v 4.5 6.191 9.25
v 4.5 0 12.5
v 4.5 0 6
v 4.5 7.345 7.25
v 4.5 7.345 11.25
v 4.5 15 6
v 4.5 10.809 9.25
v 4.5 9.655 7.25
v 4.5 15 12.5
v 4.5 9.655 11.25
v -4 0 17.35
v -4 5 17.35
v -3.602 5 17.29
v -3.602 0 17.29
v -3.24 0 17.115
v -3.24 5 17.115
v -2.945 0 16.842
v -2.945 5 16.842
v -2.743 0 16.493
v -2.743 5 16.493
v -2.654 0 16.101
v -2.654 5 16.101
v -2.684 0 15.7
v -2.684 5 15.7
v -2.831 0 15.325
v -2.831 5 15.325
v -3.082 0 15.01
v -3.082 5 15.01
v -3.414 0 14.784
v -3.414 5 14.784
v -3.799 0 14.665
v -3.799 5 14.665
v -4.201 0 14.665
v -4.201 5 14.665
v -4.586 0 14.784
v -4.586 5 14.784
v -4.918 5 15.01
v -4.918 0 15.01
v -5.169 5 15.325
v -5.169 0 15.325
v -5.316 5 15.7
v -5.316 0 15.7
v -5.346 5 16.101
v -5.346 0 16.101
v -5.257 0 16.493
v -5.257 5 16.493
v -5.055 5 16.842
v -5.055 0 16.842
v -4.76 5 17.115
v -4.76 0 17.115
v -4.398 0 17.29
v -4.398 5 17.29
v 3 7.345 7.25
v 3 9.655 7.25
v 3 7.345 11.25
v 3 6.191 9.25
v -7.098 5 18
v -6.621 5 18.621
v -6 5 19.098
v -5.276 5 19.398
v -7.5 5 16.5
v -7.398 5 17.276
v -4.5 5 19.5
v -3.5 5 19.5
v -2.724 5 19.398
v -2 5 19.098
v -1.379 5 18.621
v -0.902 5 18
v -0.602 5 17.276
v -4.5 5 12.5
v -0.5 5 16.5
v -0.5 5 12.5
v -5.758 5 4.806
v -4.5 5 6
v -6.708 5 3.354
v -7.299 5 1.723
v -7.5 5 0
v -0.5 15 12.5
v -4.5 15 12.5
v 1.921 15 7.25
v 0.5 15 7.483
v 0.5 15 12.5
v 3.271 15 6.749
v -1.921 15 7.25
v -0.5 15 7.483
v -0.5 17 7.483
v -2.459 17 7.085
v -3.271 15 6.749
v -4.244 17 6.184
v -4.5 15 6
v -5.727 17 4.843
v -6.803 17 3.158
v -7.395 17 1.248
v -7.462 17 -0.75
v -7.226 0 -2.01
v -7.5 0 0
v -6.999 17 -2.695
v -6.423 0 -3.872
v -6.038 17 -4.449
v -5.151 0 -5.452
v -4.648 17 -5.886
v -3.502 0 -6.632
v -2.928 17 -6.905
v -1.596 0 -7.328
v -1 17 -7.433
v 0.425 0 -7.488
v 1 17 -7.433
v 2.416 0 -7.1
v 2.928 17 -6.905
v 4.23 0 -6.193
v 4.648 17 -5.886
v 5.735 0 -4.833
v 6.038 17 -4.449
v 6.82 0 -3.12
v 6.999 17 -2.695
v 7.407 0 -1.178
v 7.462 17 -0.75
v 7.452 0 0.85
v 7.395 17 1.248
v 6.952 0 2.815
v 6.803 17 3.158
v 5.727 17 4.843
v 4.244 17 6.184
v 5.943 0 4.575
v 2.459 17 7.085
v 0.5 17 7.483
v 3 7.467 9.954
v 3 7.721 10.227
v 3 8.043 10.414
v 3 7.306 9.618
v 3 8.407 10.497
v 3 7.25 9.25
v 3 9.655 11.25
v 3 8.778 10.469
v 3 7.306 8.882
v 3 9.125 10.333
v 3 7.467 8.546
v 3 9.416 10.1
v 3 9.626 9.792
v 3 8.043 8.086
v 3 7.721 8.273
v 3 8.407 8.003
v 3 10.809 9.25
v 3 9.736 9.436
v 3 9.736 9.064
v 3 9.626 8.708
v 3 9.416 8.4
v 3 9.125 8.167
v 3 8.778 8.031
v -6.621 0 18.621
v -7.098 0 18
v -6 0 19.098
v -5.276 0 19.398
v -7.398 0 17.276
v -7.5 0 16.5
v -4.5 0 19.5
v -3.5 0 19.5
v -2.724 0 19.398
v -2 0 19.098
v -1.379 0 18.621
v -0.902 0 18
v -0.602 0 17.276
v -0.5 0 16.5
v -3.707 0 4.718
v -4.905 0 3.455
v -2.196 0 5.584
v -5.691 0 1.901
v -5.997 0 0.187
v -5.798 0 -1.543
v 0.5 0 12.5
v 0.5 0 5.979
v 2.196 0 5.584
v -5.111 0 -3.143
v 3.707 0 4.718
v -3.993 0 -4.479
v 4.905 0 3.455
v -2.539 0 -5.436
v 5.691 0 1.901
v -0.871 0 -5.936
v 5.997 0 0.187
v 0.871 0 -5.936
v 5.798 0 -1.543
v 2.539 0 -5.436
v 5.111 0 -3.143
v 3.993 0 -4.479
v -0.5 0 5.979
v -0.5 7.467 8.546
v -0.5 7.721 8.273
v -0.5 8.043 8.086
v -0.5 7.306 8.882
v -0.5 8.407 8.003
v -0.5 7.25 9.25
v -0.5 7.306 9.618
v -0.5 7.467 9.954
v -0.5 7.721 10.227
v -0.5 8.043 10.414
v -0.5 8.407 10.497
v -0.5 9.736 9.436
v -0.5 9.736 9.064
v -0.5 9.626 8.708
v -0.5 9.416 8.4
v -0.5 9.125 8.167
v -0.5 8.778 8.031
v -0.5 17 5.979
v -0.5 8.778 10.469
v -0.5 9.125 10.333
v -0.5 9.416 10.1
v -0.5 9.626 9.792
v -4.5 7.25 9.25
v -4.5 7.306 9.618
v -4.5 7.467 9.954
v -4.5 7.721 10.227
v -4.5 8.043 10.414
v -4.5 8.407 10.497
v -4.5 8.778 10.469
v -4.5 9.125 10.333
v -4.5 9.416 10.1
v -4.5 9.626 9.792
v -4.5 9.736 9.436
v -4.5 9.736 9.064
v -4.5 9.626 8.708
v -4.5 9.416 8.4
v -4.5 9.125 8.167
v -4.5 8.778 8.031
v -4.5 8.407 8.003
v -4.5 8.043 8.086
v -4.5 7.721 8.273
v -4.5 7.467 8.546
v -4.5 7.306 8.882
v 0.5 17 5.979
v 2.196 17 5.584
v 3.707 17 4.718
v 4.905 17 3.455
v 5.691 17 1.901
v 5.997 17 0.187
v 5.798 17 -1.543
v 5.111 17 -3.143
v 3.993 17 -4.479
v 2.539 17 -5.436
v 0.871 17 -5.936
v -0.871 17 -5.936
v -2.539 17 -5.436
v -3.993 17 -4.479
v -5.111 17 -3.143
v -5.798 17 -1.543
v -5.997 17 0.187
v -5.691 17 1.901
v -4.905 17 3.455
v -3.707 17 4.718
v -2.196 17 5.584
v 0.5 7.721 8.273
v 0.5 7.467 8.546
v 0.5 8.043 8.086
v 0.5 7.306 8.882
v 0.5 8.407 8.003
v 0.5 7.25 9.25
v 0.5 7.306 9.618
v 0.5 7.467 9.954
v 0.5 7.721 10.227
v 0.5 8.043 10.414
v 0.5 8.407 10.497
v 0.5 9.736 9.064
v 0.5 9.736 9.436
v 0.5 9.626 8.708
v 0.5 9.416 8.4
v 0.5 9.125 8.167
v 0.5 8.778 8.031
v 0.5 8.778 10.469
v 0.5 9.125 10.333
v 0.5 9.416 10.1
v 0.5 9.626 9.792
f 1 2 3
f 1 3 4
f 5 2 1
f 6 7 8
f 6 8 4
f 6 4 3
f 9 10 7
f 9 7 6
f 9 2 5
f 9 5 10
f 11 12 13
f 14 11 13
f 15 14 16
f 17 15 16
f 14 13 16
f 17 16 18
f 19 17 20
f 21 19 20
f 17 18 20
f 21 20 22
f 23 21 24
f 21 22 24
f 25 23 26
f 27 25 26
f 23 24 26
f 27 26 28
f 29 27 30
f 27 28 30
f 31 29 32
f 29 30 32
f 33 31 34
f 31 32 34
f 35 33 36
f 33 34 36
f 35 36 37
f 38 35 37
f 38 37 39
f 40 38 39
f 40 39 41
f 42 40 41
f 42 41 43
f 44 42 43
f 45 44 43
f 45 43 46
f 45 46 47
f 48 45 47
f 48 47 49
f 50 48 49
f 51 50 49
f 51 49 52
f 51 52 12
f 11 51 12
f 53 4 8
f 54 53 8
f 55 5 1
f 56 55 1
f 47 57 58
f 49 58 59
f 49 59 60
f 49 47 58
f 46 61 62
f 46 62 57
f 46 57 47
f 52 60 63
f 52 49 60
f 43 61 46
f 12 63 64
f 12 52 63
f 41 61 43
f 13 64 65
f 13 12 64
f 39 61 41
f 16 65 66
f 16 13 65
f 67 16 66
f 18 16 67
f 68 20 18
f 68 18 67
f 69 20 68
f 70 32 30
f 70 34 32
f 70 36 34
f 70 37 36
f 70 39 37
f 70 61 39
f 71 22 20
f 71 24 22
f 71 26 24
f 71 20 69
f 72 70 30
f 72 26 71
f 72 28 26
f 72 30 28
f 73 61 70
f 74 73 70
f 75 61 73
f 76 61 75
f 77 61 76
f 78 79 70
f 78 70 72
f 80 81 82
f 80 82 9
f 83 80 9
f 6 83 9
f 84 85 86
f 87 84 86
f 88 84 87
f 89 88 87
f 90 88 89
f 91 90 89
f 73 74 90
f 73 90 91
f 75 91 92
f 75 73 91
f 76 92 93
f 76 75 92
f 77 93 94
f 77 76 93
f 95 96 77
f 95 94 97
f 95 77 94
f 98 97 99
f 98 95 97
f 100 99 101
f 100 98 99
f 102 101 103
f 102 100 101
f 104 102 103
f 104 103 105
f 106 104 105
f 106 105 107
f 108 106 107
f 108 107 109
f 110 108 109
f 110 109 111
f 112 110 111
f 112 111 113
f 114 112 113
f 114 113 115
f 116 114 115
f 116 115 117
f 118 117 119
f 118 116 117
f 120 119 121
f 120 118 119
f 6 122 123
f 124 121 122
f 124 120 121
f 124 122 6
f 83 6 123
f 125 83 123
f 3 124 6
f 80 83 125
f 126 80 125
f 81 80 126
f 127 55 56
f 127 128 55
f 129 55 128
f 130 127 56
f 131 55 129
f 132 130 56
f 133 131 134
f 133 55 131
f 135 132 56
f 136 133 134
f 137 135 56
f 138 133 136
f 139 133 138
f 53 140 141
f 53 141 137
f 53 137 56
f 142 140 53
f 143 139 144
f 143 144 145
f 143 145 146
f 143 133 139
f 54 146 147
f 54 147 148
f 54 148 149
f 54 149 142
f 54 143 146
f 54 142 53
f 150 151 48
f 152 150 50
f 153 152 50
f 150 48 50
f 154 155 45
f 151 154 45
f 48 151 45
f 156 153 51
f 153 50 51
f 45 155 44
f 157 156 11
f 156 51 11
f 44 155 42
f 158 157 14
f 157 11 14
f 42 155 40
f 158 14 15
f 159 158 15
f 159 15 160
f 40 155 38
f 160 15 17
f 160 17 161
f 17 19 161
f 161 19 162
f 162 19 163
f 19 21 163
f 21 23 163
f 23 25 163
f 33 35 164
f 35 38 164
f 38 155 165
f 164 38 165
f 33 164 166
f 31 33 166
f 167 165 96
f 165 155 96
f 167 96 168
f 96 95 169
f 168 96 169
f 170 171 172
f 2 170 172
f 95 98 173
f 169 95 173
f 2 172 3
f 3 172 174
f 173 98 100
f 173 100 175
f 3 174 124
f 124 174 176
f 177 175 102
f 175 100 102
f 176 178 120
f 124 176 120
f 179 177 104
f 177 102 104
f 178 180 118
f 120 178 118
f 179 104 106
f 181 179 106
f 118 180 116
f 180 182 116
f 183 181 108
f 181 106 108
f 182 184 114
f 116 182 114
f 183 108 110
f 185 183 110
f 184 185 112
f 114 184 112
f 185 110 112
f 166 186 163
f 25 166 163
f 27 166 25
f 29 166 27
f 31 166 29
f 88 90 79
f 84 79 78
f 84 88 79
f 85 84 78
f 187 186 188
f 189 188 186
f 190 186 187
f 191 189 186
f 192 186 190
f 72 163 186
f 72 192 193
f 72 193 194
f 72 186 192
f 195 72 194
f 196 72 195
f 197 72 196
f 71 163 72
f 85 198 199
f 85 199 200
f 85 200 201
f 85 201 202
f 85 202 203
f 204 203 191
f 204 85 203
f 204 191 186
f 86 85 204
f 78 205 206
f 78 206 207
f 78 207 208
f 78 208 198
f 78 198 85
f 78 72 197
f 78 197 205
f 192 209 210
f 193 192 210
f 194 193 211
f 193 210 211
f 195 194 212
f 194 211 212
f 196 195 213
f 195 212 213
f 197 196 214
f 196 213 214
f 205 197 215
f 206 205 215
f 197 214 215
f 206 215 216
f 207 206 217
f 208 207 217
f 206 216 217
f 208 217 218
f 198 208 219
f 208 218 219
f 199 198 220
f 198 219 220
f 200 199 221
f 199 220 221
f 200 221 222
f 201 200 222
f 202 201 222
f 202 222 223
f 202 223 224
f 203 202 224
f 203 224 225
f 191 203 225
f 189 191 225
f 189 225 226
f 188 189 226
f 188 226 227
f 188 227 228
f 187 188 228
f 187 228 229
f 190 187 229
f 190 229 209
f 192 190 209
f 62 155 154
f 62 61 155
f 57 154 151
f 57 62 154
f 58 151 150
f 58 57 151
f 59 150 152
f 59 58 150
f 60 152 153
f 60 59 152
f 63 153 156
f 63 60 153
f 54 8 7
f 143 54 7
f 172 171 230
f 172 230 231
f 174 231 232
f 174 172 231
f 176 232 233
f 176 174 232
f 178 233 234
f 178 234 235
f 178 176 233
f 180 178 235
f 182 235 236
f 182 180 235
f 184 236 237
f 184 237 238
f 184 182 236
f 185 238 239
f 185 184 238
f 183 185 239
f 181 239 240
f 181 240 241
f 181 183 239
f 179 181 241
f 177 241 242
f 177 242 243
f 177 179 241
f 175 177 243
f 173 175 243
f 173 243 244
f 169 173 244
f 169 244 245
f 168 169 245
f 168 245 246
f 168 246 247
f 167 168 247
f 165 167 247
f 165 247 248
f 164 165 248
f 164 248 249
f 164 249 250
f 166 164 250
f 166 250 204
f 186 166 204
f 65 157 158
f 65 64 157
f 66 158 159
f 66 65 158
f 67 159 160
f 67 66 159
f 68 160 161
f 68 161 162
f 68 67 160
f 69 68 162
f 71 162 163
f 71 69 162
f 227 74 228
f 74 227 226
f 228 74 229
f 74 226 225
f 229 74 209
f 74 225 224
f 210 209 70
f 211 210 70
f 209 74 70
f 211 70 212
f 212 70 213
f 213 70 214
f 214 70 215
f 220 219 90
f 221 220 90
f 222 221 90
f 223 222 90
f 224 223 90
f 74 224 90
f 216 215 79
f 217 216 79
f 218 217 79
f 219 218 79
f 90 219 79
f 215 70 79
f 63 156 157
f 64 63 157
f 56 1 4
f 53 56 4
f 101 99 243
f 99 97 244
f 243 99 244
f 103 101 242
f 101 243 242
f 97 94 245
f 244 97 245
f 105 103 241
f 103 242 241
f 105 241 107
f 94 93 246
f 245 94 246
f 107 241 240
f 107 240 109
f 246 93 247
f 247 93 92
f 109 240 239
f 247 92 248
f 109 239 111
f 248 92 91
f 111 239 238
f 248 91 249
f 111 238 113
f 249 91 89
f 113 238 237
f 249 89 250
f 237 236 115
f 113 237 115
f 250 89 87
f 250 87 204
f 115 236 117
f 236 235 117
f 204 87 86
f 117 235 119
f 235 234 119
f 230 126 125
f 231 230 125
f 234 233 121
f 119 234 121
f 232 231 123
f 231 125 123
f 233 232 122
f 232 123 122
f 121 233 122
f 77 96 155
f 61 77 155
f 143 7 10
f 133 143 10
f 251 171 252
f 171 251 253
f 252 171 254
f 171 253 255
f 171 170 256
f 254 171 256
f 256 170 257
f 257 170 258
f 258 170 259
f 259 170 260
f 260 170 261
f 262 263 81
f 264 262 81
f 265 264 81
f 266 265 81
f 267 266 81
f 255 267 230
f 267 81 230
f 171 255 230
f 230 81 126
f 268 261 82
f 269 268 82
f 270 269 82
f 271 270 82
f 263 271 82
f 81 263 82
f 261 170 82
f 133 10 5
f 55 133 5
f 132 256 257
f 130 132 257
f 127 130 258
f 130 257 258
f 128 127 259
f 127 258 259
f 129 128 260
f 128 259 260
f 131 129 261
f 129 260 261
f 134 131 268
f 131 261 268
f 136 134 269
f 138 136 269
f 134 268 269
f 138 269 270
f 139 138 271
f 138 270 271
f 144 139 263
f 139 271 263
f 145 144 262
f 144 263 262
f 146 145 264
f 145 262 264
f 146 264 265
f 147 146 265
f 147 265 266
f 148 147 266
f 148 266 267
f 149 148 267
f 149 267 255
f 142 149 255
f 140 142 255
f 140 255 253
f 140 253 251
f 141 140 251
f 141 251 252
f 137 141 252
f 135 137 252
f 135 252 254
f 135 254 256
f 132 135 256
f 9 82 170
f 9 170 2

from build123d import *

# Parameters (mm, degrees)
SKETCH_1_R                  = 7.5
SKETCH_1_R_2                = 6
EXTRUDE_1_DEPTH             = 17
CUT_EXTRUDE_1_REACH         = 25.88
CUT_EXTRUDE_1_END_RADIUS    = 6
SKETCH_2_W                  = 1
SKETCH_2_H                  = 17
SKETCH_3_W                  = 4
SKETCH_3_H                  = 17
EXTRUDE_2_DEPTH             = 5
EXTRUDE_2_DIRECTION_2_REACH = 25.88
CUT_EXTRUDE_START           = -2
CUT_EXTRUDE_4_DEPTH         = 2
CUT_EXTRUDE_2_REACH         = 26.274
SKETCH_4_R                  = 1.25
CUT_EXTRUDE_3_DEPTH         = 1.5
EXTRUDE_3_DEPTH             = 5
CUT_EXTRUDE_5_REACH         = 26.094
SKETCH_9_R                  = 1.35
FILLET_1_R                  = 3


with BuildPart() as part:
    # 草图1 → 凸台-拉伸1 (new body)
    with BuildSketch(Plane(origin=(0, 0, 0), x_dir=(1, 0, 0), z_dir=(0, 1, 0))):
        with Locations(Location((0, 0, 0), (0, 0, 270))):
            Circle(SKETCH_1_R)
        with Locations(Location((0, 0, 0), (0, 0, 270))):
            Circle(SKETCH_1_R_2, mode=Mode.SUBTRACT)
    extrude(amount=EXTRUDE_1_DEPTH)

    # 切除-拉伸1: up to this cylinder (the profile starts outside it)
    cut_extrude_1_end = Plane(origin=(0, 8.5, 0), z_dir=(0, -1, 0)) * Cylinder(CUT_EXTRUDE_1_END_RADIUS, 64.76, mode=Mode.PRIVATE)
    # 草图2 → 切除-拉伸1 (cut, up to the surface)
    with BuildSketch(Plane.XY.offset(7.5), mode=Mode.PRIVATE) as cut_extrude_1_sk1:
        with Locations((0, 8.5)):
            Rectangle(SKETCH_2_W, SKETCH_2_H)
    cut_extrude_1_tool1 = extrude(cut_extrude_1_sk1.sketch, amount=-CUT_EXTRUDE_1_REACH, mode=Mode.PRIVATE) - cut_extrude_1_end
    add(cut_extrude_1_tool1.solids().sort_by_distance((0, 8.5, 7.5))[0], mode=Mode.SUBTRACT)

    # 草图3 → 凸台-拉伸2 (add)
    with BuildSketch(Plane.XY.offset(7.5)):
        with Locations((-2.5, 8.5)):
            Rectangle(SKETCH_3_W, SKETCH_3_H)
        with Locations((2.5, 8.5)):
            Rectangle(SKETCH_3_W, SKETCH_3_H)
    extrude(amount=EXTRUDE_2_DEPTH)

    # 草图3 → 凸台-拉伸2 direction 2 (add, up to next)
    with BuildSketch(Plane.XY.offset(7.5), mode=Mode.PRIVATE) as extrude_2_direction_2_sk1:
        with Locations((-2.5, 8.5)):
            Rectangle(SKETCH_3_W, SKETCH_3_H)
    extrude_2_direction_2_tool1 = extrude(extrude_2_direction_2_sk1.sketch, amount=-EXTRUDE_2_DIRECTION_2_REACH, mode=Mode.PRIVATE) - part.part
    # 草图3 → 凸台-拉伸2 direction 2 (add, up to next)
    with BuildSketch(Plane.XY.offset(7.5), mode=Mode.PRIVATE) as extrude_2_direction_2_sk2:
        with Locations((2.5, 8.5)):
            Rectangle(SKETCH_3_W, SKETCH_3_H)
    extrude_2_direction_2_tool2 = extrude(extrude_2_direction_2_sk2.sketch, amount=-EXTRUDE_2_DIRECTION_2_REACH, mode=Mode.PRIVATE) - part.part
    add(extrude_2_direction_2_tool1.solids().sort_by_distance((-2.5, 8.5, 7.5))[0])
    add(extrude_2_direction_2_tool2.solids().sort_by_distance((2.5, 8.5, 7.5))[0])

    # 草图7 → 切除-拉伸4 (cut)
    with BuildSketch(Plane(origin=(0, 17, 0), x_dir=(1, 0, 0), z_dir=(0, 1, 0)).offset(CUT_EXTRUDE_START)):
        with BuildLine():
            Line((-4.5, -6), (-4.5, -12.5))
            Line((-4.5, -12.5), (4.5, -12.5))
            Line((4.5, -12.5), (4.5, -6))
            ThreePointArc((4.5, -6), (0, -7.5), (-4.5, -6))
        make_face()
    extrude(amount=CUT_EXTRUDE_4_DEPTH, mode=Mode.SUBTRACT)

    # 切除-拉伸2: up to this face of the body (flat: up to its plane)
    cut_extrude_2_end = Plane(part.part.faces().sort_by_distance((4.5, 7.5, 9.25))[0])
    # 草图4 → 切除-拉伸2 (cut, up to the picked face)
    with BuildSketch(Plane.ZY.offset(4.5), mode=Mode.PRIVATE) as cut_extrude_2_sk1:
        with Locations(Location((9.25, 8.5, 0), (0, 0, 270))):
            Circle(SKETCH_4_R)
    cut_extrude_2_tool1 = split(extrude(cut_extrude_2_sk1.sketch, amount=-CUT_EXTRUDE_2_REACH, mode=Mode.PRIVATE), bisect_by=cut_extrude_2_end, keep=Keep.BOTH, mode=Mode.PRIVATE)
    add(cut_extrude_2_tool1.solids().sort_by(Axis((-4.5, 8.5, 9.25), (1, 0, 0)))[0], mode=Mode.SUBTRACT)

    # 草图5 → 切除-拉伸3 (cut)
    with BuildSketch(Plane(origin=(4.5, 0, 0), x_dir=(0, 0, -1), z_dir=(1, 0, 0))):
        Polygon((-9.25, 6.190598923), (-7.25, 7.345299462), (-7.25, 9.654700538), (-9.25, 10.809401077), (-11.25, 9.654700538), (-11.25, 7.345299462), align=None)
    extrude(amount=-CUT_EXTRUDE_3_DEPTH, mode=Mode.SUBTRACT)

    # 草图8 → 凸台-拉伸3 (add)
    with BuildSketch(Plane(origin=(0, 0, 0), x_dir=(1, 0, 0), z_dir=(0, 1, 0))):
        Polygon((-7.5, 0), (-7.5, -19.5), (-0.5, -19.5), (-0.5, -12.5), (-4.5, -12.5), (-4.5, -6), align=None)
    extrude(amount=EXTRUDE_3_DEPTH)

    # 草图9 → 切除-拉伸5 (cut, up to next)
    with BuildSketch(Plane(origin=(0, 5, 0), x_dir=(1, 0, 0), z_dir=(0, 1, 0)), mode=Mode.PRIVATE) as cut_extrude_5_sk1:
        with Locations(Location((-4, -16, 0), (0, 0, 270))):
            Circle(SKETCH_9_R)
    cut_extrude_5_tool1 = extrude(cut_extrude_5_sk1.sketch, amount=-CUT_EXTRUDE_5_REACH, mode=Mode.PRIVATE) & part.part
    add(cut_extrude_5_tool1.solids().sort_by_distance((-4, 5, 16))[0], mode=Mode.SUBTRACT)

    # 圆角1
    fillet_1_edges = [part.edges().sort_by_distance(p)[0] for p in [
        (-7.5, 2.5, 19.5),
        (-0.5, 2.5, 19.5),
    ]]
    fillet(fillet_1_edges, radius=FILLET_1_R)


solid = part.part
